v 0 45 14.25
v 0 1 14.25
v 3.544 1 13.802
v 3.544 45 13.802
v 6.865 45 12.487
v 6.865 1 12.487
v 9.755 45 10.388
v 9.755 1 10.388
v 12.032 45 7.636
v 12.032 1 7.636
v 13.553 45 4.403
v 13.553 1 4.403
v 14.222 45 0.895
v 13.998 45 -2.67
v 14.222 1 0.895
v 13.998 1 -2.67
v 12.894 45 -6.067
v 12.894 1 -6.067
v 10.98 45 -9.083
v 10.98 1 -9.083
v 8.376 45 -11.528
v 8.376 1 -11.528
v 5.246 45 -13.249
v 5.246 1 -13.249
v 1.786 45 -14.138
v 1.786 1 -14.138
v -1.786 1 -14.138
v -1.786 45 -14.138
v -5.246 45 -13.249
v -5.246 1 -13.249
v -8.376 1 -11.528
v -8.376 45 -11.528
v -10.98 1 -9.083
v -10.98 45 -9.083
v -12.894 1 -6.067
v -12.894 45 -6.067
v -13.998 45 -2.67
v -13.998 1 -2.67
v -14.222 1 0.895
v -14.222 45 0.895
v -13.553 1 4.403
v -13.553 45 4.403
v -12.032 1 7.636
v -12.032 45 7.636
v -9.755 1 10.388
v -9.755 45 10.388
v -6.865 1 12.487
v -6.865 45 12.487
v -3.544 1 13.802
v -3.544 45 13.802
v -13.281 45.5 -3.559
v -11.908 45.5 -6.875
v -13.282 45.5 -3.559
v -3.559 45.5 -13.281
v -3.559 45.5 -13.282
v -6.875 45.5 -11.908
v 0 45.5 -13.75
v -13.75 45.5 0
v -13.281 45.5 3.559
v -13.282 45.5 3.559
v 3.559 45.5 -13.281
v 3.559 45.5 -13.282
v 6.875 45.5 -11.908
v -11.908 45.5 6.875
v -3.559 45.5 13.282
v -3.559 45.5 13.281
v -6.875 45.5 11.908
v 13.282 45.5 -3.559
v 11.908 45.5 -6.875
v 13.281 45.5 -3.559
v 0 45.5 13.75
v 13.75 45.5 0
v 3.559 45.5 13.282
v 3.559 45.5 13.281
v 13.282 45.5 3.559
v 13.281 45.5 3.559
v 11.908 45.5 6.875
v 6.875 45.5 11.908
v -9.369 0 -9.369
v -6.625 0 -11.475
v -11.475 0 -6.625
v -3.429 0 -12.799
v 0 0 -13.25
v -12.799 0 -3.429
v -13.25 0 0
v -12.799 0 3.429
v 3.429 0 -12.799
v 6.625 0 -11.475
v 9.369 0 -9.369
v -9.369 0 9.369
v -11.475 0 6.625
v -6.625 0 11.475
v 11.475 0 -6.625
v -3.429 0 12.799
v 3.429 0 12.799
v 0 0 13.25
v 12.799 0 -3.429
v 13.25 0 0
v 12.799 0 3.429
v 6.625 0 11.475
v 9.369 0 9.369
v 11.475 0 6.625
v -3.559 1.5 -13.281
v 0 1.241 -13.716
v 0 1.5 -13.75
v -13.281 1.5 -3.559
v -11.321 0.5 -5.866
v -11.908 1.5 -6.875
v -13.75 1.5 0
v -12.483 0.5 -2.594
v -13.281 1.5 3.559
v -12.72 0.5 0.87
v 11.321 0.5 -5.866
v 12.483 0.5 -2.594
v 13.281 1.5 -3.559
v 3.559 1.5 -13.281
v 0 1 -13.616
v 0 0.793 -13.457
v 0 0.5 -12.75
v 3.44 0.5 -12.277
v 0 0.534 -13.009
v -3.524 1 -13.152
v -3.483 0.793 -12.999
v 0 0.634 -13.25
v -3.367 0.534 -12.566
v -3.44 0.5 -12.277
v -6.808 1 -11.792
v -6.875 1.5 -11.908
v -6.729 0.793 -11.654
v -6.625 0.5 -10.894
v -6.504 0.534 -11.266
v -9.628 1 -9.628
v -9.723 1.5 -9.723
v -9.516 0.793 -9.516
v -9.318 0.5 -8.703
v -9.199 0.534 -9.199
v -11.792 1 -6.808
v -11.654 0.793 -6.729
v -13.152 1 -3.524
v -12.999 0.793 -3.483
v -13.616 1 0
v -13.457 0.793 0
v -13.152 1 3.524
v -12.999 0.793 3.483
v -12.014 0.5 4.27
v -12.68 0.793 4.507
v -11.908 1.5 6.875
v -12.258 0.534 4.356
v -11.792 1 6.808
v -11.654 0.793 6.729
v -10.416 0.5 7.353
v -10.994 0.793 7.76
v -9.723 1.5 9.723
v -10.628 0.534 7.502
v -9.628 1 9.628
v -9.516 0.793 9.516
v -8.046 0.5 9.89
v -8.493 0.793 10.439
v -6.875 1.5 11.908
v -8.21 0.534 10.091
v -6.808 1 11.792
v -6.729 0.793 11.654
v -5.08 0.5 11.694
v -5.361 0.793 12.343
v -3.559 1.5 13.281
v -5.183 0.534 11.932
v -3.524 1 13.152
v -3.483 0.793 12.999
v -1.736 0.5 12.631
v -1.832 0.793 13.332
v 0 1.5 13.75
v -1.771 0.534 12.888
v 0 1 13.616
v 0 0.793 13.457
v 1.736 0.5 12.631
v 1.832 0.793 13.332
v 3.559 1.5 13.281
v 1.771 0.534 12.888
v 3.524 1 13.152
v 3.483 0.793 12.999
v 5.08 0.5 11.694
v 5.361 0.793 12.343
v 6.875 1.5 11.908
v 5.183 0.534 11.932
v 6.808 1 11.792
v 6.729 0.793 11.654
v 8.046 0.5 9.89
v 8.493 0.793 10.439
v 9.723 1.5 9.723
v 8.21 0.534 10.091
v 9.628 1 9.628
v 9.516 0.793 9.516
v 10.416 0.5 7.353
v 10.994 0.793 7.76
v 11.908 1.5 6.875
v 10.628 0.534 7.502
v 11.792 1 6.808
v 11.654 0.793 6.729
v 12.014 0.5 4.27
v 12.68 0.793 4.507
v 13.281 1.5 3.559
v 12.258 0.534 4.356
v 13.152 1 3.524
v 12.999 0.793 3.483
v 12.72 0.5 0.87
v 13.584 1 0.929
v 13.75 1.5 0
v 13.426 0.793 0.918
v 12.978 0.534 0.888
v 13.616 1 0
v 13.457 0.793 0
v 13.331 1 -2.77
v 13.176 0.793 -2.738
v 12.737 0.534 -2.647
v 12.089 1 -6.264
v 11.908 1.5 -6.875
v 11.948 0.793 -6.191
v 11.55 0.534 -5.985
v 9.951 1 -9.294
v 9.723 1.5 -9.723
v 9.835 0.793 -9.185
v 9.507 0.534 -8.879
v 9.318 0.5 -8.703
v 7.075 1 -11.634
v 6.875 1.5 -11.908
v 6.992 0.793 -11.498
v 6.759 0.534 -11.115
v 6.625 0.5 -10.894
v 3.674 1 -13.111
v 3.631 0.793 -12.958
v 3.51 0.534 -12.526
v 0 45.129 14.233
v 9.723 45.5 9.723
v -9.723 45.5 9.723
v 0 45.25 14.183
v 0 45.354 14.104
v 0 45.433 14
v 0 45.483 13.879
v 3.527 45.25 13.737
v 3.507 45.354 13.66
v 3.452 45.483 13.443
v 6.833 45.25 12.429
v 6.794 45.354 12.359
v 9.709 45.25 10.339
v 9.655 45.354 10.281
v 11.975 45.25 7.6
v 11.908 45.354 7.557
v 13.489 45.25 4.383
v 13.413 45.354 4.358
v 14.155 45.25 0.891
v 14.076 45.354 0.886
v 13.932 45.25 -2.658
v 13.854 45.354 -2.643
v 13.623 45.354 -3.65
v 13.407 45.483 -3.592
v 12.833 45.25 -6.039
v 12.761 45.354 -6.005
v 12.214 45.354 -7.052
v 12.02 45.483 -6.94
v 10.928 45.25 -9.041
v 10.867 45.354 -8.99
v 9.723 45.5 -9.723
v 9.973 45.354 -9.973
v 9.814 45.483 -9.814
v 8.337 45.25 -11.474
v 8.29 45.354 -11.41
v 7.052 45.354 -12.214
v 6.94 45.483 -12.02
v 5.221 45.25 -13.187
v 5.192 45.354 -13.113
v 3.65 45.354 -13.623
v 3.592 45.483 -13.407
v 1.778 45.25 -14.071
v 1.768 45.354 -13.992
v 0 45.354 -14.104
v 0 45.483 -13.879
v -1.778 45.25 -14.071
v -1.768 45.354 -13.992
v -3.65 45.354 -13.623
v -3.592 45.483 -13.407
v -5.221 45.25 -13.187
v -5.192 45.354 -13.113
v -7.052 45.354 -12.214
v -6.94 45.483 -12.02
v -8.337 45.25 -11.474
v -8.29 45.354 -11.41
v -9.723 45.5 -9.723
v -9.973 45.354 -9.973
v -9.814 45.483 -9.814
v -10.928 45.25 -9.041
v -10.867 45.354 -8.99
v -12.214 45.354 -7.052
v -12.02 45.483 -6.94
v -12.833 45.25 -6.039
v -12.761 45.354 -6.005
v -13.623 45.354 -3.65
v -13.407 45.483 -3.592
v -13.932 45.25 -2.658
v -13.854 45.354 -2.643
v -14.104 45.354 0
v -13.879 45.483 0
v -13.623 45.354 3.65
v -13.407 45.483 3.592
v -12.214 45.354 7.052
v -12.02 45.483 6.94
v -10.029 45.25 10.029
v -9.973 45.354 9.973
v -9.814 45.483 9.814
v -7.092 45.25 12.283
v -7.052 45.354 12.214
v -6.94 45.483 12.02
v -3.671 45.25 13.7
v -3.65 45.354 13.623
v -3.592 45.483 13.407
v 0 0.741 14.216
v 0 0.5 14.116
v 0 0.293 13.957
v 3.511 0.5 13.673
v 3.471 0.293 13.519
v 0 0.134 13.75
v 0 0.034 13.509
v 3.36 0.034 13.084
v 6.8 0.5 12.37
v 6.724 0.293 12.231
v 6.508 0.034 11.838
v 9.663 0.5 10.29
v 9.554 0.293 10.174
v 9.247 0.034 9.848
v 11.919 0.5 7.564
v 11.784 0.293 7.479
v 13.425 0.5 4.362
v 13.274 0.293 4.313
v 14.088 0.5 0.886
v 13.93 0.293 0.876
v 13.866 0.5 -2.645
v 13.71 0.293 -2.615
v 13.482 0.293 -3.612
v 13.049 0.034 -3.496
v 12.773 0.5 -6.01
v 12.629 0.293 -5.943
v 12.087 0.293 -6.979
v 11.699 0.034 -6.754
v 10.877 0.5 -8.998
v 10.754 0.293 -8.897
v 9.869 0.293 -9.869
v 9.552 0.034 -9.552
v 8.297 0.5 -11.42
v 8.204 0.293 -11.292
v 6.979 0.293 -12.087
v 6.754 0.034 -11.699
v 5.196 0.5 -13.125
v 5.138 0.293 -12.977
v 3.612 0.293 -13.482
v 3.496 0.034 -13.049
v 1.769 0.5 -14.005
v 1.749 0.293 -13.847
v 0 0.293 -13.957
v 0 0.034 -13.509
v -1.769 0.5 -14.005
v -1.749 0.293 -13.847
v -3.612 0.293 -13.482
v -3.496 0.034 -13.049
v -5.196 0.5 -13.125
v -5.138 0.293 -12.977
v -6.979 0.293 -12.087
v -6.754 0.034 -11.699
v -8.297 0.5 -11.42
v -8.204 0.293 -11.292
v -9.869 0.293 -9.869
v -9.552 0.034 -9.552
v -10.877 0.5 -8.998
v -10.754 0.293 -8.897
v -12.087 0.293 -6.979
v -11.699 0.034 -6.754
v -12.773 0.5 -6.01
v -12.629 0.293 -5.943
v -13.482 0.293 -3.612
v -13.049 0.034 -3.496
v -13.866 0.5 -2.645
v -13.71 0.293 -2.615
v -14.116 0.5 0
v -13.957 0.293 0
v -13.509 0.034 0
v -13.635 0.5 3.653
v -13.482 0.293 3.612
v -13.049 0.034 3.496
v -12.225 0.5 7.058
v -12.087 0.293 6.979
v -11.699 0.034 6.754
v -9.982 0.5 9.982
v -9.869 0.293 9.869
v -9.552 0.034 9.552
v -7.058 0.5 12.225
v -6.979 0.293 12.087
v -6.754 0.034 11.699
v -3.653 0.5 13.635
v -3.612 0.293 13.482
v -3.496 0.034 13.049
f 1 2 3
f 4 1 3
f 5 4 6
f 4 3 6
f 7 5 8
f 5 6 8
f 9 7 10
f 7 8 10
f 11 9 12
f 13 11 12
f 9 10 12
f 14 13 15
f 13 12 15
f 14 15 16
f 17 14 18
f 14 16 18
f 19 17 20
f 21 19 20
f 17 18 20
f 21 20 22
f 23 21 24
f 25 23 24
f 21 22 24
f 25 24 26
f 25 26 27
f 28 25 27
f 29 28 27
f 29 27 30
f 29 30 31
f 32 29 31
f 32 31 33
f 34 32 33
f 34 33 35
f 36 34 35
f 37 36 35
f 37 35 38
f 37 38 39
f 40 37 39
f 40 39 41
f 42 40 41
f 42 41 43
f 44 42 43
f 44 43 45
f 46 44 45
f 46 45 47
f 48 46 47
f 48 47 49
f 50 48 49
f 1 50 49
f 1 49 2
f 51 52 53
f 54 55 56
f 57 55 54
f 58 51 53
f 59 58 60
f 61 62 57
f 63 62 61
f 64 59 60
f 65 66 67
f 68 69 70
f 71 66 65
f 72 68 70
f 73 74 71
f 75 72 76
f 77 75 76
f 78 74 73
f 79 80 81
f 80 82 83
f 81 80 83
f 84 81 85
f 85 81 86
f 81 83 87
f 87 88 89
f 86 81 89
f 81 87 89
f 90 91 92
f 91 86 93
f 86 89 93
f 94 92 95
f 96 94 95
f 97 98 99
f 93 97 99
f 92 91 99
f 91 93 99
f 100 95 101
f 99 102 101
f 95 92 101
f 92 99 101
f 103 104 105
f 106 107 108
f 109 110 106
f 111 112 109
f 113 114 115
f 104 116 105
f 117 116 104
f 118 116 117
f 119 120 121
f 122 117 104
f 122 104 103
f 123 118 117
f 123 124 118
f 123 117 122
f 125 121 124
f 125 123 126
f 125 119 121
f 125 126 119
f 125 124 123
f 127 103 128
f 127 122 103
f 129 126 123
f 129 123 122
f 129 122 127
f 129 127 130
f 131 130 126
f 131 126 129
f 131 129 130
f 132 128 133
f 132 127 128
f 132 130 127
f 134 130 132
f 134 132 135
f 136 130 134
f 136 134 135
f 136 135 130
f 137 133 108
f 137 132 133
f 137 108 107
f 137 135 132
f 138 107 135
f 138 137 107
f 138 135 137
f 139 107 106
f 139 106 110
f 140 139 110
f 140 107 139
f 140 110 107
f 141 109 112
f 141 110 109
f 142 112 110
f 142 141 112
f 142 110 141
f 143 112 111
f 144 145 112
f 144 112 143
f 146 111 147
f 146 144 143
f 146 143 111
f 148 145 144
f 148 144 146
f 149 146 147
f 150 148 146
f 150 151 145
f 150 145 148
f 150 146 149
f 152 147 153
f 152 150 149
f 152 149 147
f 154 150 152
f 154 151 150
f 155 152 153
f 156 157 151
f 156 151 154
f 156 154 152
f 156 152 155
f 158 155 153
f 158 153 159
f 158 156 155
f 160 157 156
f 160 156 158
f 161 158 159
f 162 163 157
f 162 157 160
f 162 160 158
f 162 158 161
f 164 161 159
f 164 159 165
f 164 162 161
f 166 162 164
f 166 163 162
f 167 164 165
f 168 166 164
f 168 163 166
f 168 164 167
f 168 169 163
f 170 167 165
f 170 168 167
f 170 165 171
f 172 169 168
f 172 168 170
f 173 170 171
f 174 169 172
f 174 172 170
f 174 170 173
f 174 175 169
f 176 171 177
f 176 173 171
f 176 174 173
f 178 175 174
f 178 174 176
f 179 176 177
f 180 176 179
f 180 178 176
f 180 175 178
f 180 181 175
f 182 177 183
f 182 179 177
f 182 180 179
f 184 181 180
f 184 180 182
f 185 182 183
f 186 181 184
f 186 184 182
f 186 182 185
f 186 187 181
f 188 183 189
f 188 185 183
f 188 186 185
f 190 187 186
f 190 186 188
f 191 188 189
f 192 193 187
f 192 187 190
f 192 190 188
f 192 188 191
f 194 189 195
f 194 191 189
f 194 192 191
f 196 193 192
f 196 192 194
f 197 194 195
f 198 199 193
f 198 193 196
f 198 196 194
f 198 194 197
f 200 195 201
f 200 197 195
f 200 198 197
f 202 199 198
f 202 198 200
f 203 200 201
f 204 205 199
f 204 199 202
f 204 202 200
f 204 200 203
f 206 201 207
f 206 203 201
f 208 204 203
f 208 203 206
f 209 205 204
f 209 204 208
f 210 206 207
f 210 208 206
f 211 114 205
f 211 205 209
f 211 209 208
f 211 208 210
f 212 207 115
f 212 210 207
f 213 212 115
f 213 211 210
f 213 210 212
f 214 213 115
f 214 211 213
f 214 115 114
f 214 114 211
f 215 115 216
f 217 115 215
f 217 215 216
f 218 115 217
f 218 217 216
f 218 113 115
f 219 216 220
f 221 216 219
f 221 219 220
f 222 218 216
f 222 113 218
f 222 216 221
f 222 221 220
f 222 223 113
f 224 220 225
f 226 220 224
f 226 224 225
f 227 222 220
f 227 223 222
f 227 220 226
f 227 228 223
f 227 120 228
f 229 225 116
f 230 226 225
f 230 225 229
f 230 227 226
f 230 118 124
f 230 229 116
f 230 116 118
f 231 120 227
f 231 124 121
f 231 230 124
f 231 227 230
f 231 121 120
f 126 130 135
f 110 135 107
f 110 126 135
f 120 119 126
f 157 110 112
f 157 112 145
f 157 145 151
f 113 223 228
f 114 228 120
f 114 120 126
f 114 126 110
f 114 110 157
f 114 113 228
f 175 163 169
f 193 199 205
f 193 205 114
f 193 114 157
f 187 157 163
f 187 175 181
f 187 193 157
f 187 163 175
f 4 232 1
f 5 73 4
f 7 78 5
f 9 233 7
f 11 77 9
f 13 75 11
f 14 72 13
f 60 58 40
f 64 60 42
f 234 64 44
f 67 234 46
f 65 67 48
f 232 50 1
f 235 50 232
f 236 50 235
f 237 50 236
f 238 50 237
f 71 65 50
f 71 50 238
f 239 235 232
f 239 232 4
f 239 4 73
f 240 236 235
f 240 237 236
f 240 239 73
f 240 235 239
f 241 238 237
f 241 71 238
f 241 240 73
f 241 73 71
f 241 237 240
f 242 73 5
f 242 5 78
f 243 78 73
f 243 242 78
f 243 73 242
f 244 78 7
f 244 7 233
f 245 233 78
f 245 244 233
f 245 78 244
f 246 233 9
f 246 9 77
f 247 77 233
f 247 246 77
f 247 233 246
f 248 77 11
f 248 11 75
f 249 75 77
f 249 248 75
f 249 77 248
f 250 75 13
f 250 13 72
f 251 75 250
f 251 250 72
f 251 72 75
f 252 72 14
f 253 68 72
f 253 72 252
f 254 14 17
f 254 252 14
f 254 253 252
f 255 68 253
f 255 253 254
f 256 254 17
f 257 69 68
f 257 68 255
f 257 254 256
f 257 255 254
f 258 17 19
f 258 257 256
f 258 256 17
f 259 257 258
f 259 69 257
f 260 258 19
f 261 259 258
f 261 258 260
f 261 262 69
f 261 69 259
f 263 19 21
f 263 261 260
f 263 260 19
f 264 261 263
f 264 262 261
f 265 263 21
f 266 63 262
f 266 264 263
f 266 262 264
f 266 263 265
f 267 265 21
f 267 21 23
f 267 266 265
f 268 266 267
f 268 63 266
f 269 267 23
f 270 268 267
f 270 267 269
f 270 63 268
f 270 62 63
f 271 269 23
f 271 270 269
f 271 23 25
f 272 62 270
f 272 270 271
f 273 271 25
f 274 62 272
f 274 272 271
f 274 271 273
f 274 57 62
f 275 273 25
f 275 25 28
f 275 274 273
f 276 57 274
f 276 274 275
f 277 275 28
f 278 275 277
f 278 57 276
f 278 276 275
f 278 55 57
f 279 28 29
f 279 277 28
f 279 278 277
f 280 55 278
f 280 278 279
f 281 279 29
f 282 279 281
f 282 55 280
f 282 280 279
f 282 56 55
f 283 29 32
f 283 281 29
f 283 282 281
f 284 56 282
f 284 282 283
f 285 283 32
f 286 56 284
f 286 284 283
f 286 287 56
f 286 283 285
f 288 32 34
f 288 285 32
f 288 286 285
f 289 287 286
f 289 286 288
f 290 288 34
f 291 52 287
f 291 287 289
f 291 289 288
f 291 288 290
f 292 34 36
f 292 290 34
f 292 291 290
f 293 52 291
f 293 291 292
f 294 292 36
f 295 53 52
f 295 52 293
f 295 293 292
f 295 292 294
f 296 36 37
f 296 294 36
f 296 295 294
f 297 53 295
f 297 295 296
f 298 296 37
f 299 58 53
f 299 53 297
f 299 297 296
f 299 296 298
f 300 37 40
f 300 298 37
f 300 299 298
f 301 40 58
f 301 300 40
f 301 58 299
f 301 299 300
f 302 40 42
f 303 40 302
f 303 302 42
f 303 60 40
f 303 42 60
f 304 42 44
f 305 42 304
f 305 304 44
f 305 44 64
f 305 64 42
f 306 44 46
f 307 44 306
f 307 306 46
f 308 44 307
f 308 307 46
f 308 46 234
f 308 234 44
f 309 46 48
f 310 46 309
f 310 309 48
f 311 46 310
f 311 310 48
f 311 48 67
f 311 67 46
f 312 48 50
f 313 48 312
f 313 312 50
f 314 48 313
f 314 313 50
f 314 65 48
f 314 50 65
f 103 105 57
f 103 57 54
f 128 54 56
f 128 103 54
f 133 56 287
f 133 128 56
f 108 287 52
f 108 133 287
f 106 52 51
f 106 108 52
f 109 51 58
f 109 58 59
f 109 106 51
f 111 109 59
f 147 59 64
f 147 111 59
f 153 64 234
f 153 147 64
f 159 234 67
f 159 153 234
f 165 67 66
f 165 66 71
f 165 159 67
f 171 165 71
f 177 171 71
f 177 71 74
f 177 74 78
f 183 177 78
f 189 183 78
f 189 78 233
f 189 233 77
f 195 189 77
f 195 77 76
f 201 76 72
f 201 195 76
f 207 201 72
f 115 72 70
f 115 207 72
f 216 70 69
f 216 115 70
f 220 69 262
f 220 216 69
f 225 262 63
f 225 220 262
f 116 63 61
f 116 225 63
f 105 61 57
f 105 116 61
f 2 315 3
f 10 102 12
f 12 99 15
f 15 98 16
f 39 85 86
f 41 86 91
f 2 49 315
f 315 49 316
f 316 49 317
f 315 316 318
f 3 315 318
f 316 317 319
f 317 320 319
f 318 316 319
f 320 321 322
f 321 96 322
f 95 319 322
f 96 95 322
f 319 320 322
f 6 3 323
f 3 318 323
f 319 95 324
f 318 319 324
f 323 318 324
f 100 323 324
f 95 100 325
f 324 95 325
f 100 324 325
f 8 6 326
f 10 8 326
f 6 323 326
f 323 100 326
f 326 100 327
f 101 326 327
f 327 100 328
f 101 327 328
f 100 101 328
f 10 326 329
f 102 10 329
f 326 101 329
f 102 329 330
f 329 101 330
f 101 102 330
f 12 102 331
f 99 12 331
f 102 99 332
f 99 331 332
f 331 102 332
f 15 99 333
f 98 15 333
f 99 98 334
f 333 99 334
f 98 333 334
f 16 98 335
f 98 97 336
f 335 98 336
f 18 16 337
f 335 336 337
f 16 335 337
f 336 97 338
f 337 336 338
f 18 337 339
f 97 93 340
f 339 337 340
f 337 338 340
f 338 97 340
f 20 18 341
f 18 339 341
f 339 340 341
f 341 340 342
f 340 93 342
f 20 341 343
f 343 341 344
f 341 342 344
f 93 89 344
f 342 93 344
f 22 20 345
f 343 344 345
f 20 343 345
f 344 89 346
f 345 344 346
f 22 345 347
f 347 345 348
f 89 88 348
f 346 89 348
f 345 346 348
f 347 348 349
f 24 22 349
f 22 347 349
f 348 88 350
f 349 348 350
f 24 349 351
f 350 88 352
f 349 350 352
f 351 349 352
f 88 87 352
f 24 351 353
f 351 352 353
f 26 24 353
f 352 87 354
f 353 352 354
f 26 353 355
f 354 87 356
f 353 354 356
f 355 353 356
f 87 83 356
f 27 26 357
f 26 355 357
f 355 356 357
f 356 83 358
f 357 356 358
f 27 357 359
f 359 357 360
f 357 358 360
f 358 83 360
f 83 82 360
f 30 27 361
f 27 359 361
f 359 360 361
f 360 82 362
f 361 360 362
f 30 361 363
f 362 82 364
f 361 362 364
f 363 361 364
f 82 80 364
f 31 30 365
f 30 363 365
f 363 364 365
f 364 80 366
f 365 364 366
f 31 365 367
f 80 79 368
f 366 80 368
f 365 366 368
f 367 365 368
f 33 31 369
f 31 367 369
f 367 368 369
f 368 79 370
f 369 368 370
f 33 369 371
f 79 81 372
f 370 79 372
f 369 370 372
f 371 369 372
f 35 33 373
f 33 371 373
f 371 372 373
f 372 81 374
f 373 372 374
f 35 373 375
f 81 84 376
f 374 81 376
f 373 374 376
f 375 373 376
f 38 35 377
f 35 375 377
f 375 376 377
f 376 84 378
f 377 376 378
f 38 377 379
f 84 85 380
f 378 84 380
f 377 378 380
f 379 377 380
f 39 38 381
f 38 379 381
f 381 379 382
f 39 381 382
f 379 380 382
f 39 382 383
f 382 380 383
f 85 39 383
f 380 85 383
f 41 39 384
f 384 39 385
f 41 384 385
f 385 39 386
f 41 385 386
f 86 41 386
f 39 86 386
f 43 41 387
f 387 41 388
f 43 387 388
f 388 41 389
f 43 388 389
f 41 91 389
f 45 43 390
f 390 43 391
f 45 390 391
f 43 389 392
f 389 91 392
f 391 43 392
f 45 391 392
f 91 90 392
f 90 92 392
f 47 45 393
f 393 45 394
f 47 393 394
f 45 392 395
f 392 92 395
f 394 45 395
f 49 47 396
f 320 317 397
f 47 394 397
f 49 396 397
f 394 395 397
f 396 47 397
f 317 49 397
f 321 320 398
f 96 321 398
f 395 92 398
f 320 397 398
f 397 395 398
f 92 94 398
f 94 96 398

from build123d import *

# Parameters (mm, degrees)
SKETCH1_R           = 14.25
BOSS_EXTRUDE1_DEPTH = 0.5
SKETCH2_R           = 14.25
SKETCH2_R_2         = 13.75
BOSS_EXTRUDE2_DEPTH = 45
FILLET1_R           = 1
FILLET2_R           = 0.5


with BuildPart() as part:
    # Sketch1 → Boss-Extrude1 (new body)
    with BuildSketch(Plane(origin=(0, 0, 0), x_dir=(1, 0, 0), z_dir=(0, 1, 0))):
        with Locations(Location((0, 0, 0), (0, 0, 270))):
            Circle(SKETCH1_R)
    extrude(amount=BOSS_EXTRUDE1_DEPTH)

    # Sketch2 → Boss-Extrude2 (add)
    with BuildSketch(Plane(origin=(0, 0.5, 0), x_dir=(1, 0, 0), z_dir=(0, 1, 0))):
        with Locations(Location((0, 0, 0), (0, 0, 270))):
            Circle(SKETCH2_R)
        with Locations(Location((0, 0, 0), (0, 0, 90))):
            Circle(SKETCH2_R_2, mode=Mode.SUBTRACT)
    extrude(amount=BOSS_EXTRUDE2_DEPTH)

    # Fillet1
    fillet1_edges = [part.edges().sort_by_distance(p)[0] for p in [
        (0, 0, -14.25),
        (0, 0.5, 13.75),
    ]]
    fillet(fillet1_edges, radius=FILLET1_R)

    # Fillet2
    fillet2_edges = [part.edges().sort_by_distance(p)[0] for p in [
        (0, 45.5, -14.25),
    ]]
    fillet(fillet2_edges, radius=FILLET2_R - 0.0001)  # a hair under: the kernel refuses the full size


solid = part.part
